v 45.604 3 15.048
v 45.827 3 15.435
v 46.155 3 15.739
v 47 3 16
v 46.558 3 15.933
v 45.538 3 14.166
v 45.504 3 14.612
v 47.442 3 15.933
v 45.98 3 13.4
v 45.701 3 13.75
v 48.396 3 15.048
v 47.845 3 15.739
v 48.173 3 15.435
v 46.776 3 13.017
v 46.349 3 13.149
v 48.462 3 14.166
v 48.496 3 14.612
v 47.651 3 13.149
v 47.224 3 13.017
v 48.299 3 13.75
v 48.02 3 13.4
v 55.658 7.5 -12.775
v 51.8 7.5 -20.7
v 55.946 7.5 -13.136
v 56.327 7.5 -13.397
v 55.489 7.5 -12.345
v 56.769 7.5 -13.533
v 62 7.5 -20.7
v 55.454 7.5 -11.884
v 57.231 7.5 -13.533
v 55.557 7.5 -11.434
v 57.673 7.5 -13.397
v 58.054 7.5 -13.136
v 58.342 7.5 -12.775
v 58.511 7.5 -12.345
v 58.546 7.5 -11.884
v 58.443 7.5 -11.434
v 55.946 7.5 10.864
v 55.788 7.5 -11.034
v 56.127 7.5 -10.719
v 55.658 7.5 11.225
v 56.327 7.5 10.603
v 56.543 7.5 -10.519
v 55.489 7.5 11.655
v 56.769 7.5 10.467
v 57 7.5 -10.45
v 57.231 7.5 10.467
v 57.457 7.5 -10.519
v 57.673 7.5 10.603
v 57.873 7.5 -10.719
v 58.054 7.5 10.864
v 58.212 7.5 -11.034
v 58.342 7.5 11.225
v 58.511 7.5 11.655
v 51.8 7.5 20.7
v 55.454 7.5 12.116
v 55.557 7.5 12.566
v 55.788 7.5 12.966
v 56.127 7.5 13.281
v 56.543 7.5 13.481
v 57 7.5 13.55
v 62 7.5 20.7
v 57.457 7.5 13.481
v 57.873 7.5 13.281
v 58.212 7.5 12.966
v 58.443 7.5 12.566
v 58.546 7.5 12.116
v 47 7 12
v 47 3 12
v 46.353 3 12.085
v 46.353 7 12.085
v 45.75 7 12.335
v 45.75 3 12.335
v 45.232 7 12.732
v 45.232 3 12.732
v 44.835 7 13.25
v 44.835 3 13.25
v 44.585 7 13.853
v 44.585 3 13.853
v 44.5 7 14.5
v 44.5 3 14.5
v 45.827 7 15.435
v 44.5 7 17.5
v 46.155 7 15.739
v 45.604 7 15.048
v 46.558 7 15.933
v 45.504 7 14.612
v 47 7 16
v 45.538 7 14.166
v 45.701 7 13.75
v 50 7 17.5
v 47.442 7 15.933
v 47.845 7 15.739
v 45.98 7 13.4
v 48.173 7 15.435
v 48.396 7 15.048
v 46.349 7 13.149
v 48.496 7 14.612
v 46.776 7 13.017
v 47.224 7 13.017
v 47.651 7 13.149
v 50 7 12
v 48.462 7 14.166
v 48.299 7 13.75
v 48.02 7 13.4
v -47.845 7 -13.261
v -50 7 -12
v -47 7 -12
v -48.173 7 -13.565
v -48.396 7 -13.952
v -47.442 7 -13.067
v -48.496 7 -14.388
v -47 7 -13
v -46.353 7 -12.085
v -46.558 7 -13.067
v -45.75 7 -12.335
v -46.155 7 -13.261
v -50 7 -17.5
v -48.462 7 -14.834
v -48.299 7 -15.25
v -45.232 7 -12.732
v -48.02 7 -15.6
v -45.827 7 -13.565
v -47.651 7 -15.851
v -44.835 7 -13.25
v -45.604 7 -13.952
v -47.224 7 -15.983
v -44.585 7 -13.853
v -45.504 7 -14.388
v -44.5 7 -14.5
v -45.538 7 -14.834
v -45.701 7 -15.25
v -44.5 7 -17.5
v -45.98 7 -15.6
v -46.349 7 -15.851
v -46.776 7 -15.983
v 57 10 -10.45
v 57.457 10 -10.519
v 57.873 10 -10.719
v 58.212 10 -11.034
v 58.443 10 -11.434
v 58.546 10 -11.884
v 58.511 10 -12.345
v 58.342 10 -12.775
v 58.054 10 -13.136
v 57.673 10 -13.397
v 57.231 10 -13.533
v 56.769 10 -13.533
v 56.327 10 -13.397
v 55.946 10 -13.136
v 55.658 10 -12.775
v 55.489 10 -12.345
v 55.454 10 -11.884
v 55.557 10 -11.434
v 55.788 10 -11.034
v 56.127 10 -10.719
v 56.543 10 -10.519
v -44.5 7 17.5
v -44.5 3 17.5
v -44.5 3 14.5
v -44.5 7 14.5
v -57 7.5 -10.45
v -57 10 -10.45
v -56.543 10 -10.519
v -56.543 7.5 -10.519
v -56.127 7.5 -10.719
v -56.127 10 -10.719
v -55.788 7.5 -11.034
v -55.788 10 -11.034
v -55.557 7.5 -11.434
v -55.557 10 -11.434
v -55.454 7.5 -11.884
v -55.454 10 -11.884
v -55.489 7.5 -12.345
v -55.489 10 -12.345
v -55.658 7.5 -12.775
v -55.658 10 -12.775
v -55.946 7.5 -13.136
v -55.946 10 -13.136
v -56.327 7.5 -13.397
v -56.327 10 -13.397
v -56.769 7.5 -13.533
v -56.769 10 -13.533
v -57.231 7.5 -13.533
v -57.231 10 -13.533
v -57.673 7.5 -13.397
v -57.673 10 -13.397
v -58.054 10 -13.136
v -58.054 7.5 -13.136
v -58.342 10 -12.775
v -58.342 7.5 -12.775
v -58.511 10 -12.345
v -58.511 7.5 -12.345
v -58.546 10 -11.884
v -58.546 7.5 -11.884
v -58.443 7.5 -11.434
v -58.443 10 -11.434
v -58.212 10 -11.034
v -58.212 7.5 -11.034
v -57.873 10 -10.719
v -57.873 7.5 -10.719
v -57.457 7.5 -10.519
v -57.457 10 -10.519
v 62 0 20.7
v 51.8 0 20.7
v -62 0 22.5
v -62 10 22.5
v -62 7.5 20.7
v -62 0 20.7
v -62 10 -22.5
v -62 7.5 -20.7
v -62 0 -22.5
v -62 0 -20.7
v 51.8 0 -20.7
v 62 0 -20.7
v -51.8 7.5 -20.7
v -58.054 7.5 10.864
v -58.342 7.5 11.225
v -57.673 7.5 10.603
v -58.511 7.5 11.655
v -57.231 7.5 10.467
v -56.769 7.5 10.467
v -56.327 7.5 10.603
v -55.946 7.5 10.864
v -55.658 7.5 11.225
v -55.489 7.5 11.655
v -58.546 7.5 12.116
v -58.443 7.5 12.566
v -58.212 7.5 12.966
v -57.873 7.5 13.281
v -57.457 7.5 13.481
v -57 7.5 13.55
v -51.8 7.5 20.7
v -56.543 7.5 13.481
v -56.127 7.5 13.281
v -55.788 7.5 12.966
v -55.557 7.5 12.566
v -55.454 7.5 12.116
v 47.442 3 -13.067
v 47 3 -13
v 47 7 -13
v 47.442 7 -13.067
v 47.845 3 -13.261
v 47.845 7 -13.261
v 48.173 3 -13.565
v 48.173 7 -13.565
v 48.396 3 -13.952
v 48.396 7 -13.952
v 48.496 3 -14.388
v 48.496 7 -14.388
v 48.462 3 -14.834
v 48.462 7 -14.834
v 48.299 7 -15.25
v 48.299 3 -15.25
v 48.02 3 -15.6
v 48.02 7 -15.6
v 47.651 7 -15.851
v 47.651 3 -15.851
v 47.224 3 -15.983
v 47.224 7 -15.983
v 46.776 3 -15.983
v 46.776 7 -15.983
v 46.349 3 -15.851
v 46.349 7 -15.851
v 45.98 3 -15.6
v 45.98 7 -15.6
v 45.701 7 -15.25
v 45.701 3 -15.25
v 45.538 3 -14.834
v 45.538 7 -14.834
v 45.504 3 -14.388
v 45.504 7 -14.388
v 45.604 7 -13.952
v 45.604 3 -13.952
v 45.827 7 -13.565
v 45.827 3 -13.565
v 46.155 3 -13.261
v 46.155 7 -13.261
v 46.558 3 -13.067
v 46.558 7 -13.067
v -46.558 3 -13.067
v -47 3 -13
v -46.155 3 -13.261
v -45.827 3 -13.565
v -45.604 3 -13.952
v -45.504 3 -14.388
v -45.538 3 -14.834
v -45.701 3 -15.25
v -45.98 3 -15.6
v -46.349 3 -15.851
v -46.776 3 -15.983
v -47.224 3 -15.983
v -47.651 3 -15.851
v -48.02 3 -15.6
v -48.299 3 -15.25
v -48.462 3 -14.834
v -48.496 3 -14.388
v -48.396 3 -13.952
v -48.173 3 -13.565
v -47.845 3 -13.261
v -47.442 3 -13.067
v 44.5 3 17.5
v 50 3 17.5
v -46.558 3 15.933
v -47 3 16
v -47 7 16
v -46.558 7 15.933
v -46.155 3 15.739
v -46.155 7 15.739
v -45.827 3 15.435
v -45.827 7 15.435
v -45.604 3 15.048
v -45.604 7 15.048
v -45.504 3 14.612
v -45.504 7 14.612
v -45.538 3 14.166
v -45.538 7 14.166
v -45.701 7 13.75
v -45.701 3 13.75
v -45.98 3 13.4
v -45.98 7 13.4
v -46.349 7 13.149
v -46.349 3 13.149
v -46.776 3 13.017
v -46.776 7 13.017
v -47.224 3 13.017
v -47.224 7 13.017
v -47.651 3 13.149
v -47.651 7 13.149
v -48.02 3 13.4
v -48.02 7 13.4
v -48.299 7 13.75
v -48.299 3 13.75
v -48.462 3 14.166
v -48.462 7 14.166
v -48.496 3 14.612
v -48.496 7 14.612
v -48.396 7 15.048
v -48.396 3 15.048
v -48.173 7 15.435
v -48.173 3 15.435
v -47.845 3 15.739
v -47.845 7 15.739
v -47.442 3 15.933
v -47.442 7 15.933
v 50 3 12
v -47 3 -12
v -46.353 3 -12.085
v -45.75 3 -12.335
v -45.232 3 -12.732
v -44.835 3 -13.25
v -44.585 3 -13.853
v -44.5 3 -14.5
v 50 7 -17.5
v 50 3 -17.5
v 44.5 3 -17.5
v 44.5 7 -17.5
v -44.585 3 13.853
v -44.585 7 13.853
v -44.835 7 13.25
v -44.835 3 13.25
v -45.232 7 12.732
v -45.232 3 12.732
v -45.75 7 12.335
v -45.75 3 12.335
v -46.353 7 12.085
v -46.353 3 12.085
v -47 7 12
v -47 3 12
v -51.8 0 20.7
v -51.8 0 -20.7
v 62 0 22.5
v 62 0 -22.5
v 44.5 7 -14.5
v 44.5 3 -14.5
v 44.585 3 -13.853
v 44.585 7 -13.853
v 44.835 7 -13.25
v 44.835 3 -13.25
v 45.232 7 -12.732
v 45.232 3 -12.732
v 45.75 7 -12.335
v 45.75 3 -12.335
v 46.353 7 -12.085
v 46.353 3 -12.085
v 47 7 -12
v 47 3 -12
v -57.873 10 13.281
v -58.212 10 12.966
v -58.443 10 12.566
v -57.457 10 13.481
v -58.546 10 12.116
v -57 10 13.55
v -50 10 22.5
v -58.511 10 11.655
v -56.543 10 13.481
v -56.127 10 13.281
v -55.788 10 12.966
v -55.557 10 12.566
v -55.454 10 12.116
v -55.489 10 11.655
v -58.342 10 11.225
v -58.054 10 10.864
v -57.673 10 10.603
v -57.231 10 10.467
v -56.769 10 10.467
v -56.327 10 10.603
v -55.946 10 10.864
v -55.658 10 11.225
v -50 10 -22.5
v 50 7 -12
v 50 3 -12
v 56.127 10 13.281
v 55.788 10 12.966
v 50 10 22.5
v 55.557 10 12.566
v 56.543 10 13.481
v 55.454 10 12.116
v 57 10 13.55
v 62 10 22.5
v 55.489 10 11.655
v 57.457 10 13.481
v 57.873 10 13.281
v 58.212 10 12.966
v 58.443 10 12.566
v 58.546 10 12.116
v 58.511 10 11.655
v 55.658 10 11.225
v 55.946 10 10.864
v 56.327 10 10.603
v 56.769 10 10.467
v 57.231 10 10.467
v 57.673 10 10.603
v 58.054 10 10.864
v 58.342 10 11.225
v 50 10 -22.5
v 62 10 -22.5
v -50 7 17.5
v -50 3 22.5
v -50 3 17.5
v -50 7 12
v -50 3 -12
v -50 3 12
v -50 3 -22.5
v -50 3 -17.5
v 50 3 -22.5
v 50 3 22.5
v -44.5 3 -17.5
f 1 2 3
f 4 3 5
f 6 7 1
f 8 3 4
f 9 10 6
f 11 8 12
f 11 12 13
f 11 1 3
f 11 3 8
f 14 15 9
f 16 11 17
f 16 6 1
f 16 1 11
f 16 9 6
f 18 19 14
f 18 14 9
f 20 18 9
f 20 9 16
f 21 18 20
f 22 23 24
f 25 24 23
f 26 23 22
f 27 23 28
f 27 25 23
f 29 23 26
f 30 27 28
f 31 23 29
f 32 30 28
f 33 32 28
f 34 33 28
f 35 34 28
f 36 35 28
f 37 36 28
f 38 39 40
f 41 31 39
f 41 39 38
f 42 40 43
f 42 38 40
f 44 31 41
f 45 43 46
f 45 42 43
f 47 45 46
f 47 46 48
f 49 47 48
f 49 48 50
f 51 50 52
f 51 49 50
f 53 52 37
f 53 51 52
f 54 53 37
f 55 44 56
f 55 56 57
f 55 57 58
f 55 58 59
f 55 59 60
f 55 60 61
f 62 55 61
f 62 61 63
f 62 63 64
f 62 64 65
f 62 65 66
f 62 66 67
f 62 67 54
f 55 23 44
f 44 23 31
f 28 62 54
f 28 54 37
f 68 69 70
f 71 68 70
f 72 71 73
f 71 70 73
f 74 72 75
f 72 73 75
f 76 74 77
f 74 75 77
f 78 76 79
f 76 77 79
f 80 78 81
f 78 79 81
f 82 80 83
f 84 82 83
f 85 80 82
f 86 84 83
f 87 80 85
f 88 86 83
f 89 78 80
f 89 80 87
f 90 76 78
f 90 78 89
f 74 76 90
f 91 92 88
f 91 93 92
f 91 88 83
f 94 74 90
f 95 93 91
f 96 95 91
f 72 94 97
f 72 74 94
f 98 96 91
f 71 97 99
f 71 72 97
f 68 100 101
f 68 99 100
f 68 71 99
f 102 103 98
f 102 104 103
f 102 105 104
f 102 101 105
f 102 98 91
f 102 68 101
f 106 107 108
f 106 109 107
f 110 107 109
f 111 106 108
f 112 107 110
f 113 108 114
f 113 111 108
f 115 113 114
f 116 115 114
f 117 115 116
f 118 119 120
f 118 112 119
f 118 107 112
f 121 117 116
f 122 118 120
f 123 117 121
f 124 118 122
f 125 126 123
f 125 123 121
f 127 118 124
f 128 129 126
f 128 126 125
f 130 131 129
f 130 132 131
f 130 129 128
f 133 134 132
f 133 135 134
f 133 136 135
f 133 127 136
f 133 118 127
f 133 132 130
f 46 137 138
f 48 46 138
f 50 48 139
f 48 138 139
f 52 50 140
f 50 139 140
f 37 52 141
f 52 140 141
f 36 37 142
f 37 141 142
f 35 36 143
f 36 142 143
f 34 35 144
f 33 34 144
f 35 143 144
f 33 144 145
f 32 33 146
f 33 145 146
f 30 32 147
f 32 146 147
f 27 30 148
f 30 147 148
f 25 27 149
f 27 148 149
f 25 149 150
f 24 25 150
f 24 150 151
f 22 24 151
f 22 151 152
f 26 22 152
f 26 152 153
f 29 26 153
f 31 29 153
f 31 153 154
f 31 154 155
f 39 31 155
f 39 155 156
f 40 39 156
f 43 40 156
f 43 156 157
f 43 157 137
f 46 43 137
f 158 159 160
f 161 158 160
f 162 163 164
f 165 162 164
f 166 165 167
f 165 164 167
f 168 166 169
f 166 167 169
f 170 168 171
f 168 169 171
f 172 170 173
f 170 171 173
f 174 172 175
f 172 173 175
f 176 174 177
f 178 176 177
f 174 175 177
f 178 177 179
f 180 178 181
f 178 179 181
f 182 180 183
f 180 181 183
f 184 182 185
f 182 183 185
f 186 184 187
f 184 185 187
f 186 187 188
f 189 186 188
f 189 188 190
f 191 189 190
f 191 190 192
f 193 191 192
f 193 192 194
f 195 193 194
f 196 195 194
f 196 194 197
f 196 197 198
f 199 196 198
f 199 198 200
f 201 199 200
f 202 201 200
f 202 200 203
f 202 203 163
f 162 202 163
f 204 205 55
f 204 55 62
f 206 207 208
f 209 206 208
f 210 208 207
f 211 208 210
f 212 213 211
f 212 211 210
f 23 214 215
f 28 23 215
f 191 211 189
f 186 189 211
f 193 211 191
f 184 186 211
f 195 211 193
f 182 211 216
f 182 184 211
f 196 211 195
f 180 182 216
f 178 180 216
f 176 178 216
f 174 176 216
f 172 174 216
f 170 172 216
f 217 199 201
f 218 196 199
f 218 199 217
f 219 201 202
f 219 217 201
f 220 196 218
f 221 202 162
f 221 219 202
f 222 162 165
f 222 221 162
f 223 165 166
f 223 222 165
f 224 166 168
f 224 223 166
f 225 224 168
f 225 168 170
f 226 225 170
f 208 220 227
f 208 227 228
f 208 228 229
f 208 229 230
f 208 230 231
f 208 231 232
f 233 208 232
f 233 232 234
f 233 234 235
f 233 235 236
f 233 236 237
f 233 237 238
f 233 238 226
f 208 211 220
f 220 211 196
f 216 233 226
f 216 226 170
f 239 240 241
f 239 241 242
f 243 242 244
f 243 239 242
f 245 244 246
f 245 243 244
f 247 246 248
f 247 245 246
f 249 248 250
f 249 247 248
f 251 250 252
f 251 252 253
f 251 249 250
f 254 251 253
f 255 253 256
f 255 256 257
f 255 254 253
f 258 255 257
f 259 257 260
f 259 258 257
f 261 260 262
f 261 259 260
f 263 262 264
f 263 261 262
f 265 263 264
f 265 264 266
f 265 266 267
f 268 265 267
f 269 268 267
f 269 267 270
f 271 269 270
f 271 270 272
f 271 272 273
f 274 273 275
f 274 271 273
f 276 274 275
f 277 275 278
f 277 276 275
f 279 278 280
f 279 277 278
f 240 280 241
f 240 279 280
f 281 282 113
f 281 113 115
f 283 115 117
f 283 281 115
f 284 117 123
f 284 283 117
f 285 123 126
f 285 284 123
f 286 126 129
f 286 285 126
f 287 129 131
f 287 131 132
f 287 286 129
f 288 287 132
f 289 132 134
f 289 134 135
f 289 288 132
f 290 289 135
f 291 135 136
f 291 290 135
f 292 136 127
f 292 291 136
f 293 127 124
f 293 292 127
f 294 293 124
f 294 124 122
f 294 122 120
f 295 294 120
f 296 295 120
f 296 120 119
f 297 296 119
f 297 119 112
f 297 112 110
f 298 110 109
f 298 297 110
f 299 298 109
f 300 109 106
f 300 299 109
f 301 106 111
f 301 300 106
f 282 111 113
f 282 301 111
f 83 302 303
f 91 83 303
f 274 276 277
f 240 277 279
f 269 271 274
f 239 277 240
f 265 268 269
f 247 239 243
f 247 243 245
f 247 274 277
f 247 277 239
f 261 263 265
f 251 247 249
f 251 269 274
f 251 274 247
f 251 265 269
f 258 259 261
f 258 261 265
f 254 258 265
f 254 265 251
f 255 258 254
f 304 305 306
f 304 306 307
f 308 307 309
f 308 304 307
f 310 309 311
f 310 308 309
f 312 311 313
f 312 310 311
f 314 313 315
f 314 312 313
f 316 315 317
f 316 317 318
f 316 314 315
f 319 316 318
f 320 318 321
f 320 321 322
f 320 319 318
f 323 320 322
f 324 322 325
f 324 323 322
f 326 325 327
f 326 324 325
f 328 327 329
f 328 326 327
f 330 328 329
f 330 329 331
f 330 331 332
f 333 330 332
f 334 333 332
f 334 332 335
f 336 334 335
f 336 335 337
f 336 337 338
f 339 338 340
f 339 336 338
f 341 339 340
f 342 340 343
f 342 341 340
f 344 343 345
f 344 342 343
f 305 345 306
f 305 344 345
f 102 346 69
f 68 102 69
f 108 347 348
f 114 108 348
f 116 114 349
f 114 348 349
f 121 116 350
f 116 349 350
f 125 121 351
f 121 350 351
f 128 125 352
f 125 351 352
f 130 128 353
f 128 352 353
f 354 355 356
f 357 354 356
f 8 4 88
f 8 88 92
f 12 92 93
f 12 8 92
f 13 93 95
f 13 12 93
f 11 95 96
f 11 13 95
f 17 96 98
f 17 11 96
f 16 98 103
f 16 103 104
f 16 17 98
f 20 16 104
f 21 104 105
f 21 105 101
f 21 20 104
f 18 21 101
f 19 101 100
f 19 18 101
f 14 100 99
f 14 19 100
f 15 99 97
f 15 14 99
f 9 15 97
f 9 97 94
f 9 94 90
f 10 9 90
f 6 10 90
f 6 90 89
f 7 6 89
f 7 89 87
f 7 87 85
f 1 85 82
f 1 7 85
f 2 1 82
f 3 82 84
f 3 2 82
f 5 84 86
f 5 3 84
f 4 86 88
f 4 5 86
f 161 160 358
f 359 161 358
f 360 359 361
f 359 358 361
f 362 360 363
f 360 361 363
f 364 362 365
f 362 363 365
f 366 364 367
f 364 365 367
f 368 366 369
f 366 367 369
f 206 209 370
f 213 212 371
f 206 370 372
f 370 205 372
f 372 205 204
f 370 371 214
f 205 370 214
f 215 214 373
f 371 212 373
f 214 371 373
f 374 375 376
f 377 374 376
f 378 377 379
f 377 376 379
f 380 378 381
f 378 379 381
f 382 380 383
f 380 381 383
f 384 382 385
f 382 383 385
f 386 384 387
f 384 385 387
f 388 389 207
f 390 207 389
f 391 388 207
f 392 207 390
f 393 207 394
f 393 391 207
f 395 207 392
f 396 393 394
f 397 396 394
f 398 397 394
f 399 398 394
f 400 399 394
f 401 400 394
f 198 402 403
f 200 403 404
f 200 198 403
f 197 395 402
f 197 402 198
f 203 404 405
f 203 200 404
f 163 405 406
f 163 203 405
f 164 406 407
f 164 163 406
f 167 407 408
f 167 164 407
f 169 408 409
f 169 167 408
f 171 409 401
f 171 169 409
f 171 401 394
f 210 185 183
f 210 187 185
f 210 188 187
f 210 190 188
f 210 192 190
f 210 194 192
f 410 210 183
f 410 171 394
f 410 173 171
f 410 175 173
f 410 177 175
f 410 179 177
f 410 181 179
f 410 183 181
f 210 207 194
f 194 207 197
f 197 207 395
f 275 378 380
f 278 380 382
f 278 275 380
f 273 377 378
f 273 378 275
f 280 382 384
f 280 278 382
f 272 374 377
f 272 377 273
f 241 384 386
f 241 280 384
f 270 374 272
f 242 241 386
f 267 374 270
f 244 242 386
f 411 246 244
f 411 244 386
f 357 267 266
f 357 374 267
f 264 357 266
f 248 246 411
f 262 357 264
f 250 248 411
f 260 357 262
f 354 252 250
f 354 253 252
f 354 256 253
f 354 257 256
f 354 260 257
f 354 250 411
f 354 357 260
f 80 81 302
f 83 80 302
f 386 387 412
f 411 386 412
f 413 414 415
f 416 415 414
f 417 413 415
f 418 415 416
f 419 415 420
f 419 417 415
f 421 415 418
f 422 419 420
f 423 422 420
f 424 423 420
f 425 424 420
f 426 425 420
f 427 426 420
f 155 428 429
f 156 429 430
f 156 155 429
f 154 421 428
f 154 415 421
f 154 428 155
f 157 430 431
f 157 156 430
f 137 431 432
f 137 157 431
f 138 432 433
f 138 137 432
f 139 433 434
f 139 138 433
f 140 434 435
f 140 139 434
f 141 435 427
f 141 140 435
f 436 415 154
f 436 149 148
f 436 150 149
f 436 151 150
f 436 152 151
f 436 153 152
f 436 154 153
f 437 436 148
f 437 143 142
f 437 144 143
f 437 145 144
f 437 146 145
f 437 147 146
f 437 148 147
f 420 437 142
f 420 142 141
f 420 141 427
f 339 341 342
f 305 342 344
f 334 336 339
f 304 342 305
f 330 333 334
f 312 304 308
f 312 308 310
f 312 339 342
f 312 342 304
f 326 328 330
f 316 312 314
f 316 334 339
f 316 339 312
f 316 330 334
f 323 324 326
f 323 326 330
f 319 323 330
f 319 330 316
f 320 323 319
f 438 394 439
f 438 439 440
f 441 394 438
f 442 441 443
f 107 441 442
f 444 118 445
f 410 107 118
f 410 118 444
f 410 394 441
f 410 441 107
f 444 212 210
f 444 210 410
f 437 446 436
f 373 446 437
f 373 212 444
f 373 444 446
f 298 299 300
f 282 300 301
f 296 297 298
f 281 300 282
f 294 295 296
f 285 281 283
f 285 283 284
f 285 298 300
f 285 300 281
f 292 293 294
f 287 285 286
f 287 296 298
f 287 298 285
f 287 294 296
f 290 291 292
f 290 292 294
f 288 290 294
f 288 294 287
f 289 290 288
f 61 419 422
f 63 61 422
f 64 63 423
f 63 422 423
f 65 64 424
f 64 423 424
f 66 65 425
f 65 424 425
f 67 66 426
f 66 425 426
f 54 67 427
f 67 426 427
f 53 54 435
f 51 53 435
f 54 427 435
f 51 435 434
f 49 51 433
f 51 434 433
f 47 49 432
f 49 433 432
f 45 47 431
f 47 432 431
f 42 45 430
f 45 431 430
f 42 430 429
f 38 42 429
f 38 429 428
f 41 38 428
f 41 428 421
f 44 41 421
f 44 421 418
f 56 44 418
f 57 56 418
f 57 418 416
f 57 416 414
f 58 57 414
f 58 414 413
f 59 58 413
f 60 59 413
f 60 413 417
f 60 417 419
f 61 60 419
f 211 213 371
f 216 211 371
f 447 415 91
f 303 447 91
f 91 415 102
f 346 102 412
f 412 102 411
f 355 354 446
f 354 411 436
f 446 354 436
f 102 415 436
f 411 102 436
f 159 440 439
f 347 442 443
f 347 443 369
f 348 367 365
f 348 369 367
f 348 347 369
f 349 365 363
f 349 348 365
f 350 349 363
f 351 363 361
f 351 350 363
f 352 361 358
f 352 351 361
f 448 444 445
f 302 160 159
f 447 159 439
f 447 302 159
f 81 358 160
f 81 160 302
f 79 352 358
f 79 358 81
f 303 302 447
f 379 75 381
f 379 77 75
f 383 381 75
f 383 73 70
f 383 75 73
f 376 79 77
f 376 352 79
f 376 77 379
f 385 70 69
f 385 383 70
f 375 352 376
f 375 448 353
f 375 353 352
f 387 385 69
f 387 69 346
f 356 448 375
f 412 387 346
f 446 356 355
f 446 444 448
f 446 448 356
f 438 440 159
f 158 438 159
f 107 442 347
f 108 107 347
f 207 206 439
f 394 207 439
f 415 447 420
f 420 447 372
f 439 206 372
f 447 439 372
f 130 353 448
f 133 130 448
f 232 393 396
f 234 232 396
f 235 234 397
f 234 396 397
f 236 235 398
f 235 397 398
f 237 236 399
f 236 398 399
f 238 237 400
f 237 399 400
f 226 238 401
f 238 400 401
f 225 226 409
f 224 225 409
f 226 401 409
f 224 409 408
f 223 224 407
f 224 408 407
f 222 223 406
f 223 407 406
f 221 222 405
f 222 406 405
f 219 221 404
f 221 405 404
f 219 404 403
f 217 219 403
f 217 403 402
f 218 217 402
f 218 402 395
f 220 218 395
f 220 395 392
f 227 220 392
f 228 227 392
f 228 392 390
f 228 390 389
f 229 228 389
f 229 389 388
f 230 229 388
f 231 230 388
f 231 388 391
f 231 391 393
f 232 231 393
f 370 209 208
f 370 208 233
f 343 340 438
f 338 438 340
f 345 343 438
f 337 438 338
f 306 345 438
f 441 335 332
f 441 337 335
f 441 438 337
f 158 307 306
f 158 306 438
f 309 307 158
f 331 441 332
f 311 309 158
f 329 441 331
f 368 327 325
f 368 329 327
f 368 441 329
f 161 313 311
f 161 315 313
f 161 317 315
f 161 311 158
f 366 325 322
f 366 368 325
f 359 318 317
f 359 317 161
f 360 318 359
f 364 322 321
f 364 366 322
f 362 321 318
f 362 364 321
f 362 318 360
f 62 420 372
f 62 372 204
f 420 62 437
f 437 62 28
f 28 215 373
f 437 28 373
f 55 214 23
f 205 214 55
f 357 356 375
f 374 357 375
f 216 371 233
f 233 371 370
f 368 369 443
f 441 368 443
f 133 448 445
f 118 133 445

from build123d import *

# Parameters (mm, degrees)
SKETCH2_W           = 124
SKETCH2_H           = 45
BOSS_EXTRUDE3_DEPTH = 10
SKETCH4_W           = 100
SKETCH4_H           = 45
CUT_EXTRUDE1_DEPTH  = 7
CUT_EXTRUDE2_REACH  = 68.71
SKETCH5_R           = 1.55
SKETCH6_W           = 10.2
SKETCH6_H           = 41.4
CUT_EXTRUDE3_DEPTH  = 7.5
SKETCH7_R           = 1.5
BOSS_EXTRUDE4_DEPTH = 4


with BuildPart() as part:
    # Sketch2 → Boss-Extrude3 (new body)
    with BuildSketch(Plane(origin=(0, 0, 0), x_dir=(1, 0, 0), z_dir=(0, 1, 0))):
        Rectangle(SKETCH2_W, SKETCH2_H)
    extrude(amount=BOSS_EXTRUDE3_DEPTH)

    # Sketch4 → Cut-Extrude1 (cut)
    with BuildSketch(Plane(origin=(0, 10, 0), x_dir=(1, 0, 0), z_dir=(0, 1, 0))):
        Rectangle(SKETCH4_W, SKETCH4_H)
    extrude(amount=-CUT_EXTRUDE1_DEPTH, mode=Mode.SUBTRACT)

    # Sketch5 → Cut-Extrude2 (cut, up to next)
    with BuildSketch(Plane(origin=(0, 10, 0), x_dir=(1, 0, 0), z_dir=(0, 1, 0)), mode=Mode.PRIVATE) as cut_extrude2_sk1:
        with Locations(Location((-57, 12, 0), (0, 0, 270))):
            Circle(SKETCH5_R)
    cut_extrude2_tool1 = extrude(cut_extrude2_sk1.sketch, amount=-CUT_EXTRUDE2_REACH, mode=Mode.PRIVATE) & part.part
    # Sketch5 → Cut-Extrude2 (cut, up to next)
    with BuildSketch(Plane(origin=(0, 10, 0), x_dir=(1, 0, 0), z_dir=(0, 1, 0)), mode=Mode.PRIVATE) as cut_extrude2_sk2:
        with Locations(Location((-57, -12, 0), (0, 0, 270))):
            Circle(SKETCH5_R)
    cut_extrude2_tool2 = extrude(cut_extrude2_sk2.sketch, amount=-CUT_EXTRUDE2_REACH, mode=Mode.PRIVATE) & part.part
    # Sketch5 → Cut-Extrude2 (cut, up to next)
    with BuildSketch(Plane(origin=(0, 10, 0), x_dir=(1, 0, 0), z_dir=(0, 1, 0)), mode=Mode.PRIVATE) as cut_extrude2_sk3:
        with Locations(Location((57, -12, 0), (0, 0, 270))):
            Circle(SKETCH5_R)
    cut_extrude2_tool3 = extrude(cut_extrude2_sk3.sketch, amount=-CUT_EXTRUDE2_REACH, mode=Mode.PRIVATE) & part.part
    # Sketch5 → Cut-Extrude2 (cut, up to next)
    with BuildSketch(Plane(origin=(0, 10, 0), x_dir=(1, 0, 0), z_dir=(0, 1, 0)), mode=Mode.PRIVATE) as cut_extrude2_sk4:
        with Locations(Location((57, 12, 0), (0, 0, 270))):
            Circle(SKETCH5_R)
    cut_extrude2_tool4 = extrude(cut_extrude2_sk4.sketch, amount=-CUT_EXTRUDE2_REACH, mode=Mode.PRIVATE) & part.part
    add(cut_extrude2_tool1.solids().sort_by_distance((-57, 10, -12))[0], mode=Mode.SUBTRACT)
    add(cut_extrude2_tool2.solids().sort_by_distance((-57, 10, 12))[0], mode=Mode.SUBTRACT)
    add(cut_extrude2_tool3.solids().sort_by_distance((57, 10, 12))[0], mode=Mode.SUBTRACT)
    add(cut_extrude2_tool4.solids().sort_by_distance((57, 10, -12))[0], mode=Mode.SUBTRACT)

    # Sketch6 → Cut-Extrude3 (cut)
    with BuildSketch(Plane.XZ):
        with Locations((-56.9, 0)):
            Rectangle(SKETCH6_W, SKETCH6_H)
        with Locations((56.9, 0)):
            Rectangle(SKETCH6_W, SKETCH6_H)
    extrude(amount=-CUT_EXTRUDE3_DEPTH, mode=Mode.SUBTRACT)

    # Sketch7 → Boss-Extrude4 (add)
    # profile 1 of 4: a face of its own
    with BuildSketch(Plane(origin=(0, 3, 0), x_dir=(1, 0, 0), z_dir=(0, 1, 0))):
        with BuildLine():
            Line((-50, -17.5), (-44.5, -17.5))
            Line((-44.5, -17.5), (-44.5, -14.5))
            ThreePointArc((-44.5, -14.5), (-45.232233047, -12.732233047), (-47, -12))
            Line((-47, -12), (-50, -12))
            Line((-50, -12), (-50, -17.5))
        make_face()
        with Locations(Location((-47, -14.5, 0), (0, 0, 270))):
            Circle(SKETCH7_R, mode=Mode.SUBTRACT)
    # profile 2 of 4: a face of its own
    with BuildSketch(Plane(origin=(0, 3, 0), x_dir=(1, 0, 0), z_dir=(0, 1, 0))):
        with BuildLine():
            Line((44.5, -14.5), (44.5, -17.5))
            Line((44.5, -17.5), (50, -17.5))
            Line((50, -17.5), (50, -12))
            Line((50, -12), (47, -12))
            ThreePointArc((47, -12), (45.232233047, -12.732233047), (44.5, -14.5))
        make_face()
        with Locations(Location((47, -14.5, 0), (0, 0, 270))):
            Circle(SKETCH7_R, mode=Mode.SUBTRACT)
    # profile 3 of 4: a face of its own
    with BuildSketch(Plane(origin=(0, 3, 0), x_dir=(1, 0, 0), z_dir=(0, 1, 0))):
        with BuildLine():
            Line((-50, 17.5), (-50, 12))
            Line((-50, 12), (-47, 12))
            ThreePointArc((-47, 12), (-45.232233047, 12.732233047), (-44.5, 14.5))
            Line((-44.5, 14.5), (-44.5, 17.5))
            Line((-44.5, 17.5), (-50, 17.5))
        make_face()
        with Locations(Location((-47, 14.5, 0), (0, 0, 270))):
            Circle(SKETCH7_R, mode=Mode.SUBTRACT)
    # profile 4 of 4: a face of its own
    with BuildSketch(Plane(origin=(0, 3, 0), x_dir=(1, 0, 0), z_dir=(0, 1, 0))):
        with BuildLine():
            Line((47, 12), (50, 12))
            Line((50, 12), (50, 17.5))
            Line((50, 17.5), (44.5, 17.5))
            Line((44.5, 17.5), (44.5, 14.5))
            ThreePointArc((44.5, 14.5), (45.232233047, 12.732233047), (47, 12))
        make_face()
        with Locations(Location((47, 14.5, 0), (0, 0, 270))):
            Circle(SKETCH7_R, mode=Mode.SUBTRACT)
    extrude(amount=BOSS_EXTRUDE4_DEPTH)


solid = part.part
